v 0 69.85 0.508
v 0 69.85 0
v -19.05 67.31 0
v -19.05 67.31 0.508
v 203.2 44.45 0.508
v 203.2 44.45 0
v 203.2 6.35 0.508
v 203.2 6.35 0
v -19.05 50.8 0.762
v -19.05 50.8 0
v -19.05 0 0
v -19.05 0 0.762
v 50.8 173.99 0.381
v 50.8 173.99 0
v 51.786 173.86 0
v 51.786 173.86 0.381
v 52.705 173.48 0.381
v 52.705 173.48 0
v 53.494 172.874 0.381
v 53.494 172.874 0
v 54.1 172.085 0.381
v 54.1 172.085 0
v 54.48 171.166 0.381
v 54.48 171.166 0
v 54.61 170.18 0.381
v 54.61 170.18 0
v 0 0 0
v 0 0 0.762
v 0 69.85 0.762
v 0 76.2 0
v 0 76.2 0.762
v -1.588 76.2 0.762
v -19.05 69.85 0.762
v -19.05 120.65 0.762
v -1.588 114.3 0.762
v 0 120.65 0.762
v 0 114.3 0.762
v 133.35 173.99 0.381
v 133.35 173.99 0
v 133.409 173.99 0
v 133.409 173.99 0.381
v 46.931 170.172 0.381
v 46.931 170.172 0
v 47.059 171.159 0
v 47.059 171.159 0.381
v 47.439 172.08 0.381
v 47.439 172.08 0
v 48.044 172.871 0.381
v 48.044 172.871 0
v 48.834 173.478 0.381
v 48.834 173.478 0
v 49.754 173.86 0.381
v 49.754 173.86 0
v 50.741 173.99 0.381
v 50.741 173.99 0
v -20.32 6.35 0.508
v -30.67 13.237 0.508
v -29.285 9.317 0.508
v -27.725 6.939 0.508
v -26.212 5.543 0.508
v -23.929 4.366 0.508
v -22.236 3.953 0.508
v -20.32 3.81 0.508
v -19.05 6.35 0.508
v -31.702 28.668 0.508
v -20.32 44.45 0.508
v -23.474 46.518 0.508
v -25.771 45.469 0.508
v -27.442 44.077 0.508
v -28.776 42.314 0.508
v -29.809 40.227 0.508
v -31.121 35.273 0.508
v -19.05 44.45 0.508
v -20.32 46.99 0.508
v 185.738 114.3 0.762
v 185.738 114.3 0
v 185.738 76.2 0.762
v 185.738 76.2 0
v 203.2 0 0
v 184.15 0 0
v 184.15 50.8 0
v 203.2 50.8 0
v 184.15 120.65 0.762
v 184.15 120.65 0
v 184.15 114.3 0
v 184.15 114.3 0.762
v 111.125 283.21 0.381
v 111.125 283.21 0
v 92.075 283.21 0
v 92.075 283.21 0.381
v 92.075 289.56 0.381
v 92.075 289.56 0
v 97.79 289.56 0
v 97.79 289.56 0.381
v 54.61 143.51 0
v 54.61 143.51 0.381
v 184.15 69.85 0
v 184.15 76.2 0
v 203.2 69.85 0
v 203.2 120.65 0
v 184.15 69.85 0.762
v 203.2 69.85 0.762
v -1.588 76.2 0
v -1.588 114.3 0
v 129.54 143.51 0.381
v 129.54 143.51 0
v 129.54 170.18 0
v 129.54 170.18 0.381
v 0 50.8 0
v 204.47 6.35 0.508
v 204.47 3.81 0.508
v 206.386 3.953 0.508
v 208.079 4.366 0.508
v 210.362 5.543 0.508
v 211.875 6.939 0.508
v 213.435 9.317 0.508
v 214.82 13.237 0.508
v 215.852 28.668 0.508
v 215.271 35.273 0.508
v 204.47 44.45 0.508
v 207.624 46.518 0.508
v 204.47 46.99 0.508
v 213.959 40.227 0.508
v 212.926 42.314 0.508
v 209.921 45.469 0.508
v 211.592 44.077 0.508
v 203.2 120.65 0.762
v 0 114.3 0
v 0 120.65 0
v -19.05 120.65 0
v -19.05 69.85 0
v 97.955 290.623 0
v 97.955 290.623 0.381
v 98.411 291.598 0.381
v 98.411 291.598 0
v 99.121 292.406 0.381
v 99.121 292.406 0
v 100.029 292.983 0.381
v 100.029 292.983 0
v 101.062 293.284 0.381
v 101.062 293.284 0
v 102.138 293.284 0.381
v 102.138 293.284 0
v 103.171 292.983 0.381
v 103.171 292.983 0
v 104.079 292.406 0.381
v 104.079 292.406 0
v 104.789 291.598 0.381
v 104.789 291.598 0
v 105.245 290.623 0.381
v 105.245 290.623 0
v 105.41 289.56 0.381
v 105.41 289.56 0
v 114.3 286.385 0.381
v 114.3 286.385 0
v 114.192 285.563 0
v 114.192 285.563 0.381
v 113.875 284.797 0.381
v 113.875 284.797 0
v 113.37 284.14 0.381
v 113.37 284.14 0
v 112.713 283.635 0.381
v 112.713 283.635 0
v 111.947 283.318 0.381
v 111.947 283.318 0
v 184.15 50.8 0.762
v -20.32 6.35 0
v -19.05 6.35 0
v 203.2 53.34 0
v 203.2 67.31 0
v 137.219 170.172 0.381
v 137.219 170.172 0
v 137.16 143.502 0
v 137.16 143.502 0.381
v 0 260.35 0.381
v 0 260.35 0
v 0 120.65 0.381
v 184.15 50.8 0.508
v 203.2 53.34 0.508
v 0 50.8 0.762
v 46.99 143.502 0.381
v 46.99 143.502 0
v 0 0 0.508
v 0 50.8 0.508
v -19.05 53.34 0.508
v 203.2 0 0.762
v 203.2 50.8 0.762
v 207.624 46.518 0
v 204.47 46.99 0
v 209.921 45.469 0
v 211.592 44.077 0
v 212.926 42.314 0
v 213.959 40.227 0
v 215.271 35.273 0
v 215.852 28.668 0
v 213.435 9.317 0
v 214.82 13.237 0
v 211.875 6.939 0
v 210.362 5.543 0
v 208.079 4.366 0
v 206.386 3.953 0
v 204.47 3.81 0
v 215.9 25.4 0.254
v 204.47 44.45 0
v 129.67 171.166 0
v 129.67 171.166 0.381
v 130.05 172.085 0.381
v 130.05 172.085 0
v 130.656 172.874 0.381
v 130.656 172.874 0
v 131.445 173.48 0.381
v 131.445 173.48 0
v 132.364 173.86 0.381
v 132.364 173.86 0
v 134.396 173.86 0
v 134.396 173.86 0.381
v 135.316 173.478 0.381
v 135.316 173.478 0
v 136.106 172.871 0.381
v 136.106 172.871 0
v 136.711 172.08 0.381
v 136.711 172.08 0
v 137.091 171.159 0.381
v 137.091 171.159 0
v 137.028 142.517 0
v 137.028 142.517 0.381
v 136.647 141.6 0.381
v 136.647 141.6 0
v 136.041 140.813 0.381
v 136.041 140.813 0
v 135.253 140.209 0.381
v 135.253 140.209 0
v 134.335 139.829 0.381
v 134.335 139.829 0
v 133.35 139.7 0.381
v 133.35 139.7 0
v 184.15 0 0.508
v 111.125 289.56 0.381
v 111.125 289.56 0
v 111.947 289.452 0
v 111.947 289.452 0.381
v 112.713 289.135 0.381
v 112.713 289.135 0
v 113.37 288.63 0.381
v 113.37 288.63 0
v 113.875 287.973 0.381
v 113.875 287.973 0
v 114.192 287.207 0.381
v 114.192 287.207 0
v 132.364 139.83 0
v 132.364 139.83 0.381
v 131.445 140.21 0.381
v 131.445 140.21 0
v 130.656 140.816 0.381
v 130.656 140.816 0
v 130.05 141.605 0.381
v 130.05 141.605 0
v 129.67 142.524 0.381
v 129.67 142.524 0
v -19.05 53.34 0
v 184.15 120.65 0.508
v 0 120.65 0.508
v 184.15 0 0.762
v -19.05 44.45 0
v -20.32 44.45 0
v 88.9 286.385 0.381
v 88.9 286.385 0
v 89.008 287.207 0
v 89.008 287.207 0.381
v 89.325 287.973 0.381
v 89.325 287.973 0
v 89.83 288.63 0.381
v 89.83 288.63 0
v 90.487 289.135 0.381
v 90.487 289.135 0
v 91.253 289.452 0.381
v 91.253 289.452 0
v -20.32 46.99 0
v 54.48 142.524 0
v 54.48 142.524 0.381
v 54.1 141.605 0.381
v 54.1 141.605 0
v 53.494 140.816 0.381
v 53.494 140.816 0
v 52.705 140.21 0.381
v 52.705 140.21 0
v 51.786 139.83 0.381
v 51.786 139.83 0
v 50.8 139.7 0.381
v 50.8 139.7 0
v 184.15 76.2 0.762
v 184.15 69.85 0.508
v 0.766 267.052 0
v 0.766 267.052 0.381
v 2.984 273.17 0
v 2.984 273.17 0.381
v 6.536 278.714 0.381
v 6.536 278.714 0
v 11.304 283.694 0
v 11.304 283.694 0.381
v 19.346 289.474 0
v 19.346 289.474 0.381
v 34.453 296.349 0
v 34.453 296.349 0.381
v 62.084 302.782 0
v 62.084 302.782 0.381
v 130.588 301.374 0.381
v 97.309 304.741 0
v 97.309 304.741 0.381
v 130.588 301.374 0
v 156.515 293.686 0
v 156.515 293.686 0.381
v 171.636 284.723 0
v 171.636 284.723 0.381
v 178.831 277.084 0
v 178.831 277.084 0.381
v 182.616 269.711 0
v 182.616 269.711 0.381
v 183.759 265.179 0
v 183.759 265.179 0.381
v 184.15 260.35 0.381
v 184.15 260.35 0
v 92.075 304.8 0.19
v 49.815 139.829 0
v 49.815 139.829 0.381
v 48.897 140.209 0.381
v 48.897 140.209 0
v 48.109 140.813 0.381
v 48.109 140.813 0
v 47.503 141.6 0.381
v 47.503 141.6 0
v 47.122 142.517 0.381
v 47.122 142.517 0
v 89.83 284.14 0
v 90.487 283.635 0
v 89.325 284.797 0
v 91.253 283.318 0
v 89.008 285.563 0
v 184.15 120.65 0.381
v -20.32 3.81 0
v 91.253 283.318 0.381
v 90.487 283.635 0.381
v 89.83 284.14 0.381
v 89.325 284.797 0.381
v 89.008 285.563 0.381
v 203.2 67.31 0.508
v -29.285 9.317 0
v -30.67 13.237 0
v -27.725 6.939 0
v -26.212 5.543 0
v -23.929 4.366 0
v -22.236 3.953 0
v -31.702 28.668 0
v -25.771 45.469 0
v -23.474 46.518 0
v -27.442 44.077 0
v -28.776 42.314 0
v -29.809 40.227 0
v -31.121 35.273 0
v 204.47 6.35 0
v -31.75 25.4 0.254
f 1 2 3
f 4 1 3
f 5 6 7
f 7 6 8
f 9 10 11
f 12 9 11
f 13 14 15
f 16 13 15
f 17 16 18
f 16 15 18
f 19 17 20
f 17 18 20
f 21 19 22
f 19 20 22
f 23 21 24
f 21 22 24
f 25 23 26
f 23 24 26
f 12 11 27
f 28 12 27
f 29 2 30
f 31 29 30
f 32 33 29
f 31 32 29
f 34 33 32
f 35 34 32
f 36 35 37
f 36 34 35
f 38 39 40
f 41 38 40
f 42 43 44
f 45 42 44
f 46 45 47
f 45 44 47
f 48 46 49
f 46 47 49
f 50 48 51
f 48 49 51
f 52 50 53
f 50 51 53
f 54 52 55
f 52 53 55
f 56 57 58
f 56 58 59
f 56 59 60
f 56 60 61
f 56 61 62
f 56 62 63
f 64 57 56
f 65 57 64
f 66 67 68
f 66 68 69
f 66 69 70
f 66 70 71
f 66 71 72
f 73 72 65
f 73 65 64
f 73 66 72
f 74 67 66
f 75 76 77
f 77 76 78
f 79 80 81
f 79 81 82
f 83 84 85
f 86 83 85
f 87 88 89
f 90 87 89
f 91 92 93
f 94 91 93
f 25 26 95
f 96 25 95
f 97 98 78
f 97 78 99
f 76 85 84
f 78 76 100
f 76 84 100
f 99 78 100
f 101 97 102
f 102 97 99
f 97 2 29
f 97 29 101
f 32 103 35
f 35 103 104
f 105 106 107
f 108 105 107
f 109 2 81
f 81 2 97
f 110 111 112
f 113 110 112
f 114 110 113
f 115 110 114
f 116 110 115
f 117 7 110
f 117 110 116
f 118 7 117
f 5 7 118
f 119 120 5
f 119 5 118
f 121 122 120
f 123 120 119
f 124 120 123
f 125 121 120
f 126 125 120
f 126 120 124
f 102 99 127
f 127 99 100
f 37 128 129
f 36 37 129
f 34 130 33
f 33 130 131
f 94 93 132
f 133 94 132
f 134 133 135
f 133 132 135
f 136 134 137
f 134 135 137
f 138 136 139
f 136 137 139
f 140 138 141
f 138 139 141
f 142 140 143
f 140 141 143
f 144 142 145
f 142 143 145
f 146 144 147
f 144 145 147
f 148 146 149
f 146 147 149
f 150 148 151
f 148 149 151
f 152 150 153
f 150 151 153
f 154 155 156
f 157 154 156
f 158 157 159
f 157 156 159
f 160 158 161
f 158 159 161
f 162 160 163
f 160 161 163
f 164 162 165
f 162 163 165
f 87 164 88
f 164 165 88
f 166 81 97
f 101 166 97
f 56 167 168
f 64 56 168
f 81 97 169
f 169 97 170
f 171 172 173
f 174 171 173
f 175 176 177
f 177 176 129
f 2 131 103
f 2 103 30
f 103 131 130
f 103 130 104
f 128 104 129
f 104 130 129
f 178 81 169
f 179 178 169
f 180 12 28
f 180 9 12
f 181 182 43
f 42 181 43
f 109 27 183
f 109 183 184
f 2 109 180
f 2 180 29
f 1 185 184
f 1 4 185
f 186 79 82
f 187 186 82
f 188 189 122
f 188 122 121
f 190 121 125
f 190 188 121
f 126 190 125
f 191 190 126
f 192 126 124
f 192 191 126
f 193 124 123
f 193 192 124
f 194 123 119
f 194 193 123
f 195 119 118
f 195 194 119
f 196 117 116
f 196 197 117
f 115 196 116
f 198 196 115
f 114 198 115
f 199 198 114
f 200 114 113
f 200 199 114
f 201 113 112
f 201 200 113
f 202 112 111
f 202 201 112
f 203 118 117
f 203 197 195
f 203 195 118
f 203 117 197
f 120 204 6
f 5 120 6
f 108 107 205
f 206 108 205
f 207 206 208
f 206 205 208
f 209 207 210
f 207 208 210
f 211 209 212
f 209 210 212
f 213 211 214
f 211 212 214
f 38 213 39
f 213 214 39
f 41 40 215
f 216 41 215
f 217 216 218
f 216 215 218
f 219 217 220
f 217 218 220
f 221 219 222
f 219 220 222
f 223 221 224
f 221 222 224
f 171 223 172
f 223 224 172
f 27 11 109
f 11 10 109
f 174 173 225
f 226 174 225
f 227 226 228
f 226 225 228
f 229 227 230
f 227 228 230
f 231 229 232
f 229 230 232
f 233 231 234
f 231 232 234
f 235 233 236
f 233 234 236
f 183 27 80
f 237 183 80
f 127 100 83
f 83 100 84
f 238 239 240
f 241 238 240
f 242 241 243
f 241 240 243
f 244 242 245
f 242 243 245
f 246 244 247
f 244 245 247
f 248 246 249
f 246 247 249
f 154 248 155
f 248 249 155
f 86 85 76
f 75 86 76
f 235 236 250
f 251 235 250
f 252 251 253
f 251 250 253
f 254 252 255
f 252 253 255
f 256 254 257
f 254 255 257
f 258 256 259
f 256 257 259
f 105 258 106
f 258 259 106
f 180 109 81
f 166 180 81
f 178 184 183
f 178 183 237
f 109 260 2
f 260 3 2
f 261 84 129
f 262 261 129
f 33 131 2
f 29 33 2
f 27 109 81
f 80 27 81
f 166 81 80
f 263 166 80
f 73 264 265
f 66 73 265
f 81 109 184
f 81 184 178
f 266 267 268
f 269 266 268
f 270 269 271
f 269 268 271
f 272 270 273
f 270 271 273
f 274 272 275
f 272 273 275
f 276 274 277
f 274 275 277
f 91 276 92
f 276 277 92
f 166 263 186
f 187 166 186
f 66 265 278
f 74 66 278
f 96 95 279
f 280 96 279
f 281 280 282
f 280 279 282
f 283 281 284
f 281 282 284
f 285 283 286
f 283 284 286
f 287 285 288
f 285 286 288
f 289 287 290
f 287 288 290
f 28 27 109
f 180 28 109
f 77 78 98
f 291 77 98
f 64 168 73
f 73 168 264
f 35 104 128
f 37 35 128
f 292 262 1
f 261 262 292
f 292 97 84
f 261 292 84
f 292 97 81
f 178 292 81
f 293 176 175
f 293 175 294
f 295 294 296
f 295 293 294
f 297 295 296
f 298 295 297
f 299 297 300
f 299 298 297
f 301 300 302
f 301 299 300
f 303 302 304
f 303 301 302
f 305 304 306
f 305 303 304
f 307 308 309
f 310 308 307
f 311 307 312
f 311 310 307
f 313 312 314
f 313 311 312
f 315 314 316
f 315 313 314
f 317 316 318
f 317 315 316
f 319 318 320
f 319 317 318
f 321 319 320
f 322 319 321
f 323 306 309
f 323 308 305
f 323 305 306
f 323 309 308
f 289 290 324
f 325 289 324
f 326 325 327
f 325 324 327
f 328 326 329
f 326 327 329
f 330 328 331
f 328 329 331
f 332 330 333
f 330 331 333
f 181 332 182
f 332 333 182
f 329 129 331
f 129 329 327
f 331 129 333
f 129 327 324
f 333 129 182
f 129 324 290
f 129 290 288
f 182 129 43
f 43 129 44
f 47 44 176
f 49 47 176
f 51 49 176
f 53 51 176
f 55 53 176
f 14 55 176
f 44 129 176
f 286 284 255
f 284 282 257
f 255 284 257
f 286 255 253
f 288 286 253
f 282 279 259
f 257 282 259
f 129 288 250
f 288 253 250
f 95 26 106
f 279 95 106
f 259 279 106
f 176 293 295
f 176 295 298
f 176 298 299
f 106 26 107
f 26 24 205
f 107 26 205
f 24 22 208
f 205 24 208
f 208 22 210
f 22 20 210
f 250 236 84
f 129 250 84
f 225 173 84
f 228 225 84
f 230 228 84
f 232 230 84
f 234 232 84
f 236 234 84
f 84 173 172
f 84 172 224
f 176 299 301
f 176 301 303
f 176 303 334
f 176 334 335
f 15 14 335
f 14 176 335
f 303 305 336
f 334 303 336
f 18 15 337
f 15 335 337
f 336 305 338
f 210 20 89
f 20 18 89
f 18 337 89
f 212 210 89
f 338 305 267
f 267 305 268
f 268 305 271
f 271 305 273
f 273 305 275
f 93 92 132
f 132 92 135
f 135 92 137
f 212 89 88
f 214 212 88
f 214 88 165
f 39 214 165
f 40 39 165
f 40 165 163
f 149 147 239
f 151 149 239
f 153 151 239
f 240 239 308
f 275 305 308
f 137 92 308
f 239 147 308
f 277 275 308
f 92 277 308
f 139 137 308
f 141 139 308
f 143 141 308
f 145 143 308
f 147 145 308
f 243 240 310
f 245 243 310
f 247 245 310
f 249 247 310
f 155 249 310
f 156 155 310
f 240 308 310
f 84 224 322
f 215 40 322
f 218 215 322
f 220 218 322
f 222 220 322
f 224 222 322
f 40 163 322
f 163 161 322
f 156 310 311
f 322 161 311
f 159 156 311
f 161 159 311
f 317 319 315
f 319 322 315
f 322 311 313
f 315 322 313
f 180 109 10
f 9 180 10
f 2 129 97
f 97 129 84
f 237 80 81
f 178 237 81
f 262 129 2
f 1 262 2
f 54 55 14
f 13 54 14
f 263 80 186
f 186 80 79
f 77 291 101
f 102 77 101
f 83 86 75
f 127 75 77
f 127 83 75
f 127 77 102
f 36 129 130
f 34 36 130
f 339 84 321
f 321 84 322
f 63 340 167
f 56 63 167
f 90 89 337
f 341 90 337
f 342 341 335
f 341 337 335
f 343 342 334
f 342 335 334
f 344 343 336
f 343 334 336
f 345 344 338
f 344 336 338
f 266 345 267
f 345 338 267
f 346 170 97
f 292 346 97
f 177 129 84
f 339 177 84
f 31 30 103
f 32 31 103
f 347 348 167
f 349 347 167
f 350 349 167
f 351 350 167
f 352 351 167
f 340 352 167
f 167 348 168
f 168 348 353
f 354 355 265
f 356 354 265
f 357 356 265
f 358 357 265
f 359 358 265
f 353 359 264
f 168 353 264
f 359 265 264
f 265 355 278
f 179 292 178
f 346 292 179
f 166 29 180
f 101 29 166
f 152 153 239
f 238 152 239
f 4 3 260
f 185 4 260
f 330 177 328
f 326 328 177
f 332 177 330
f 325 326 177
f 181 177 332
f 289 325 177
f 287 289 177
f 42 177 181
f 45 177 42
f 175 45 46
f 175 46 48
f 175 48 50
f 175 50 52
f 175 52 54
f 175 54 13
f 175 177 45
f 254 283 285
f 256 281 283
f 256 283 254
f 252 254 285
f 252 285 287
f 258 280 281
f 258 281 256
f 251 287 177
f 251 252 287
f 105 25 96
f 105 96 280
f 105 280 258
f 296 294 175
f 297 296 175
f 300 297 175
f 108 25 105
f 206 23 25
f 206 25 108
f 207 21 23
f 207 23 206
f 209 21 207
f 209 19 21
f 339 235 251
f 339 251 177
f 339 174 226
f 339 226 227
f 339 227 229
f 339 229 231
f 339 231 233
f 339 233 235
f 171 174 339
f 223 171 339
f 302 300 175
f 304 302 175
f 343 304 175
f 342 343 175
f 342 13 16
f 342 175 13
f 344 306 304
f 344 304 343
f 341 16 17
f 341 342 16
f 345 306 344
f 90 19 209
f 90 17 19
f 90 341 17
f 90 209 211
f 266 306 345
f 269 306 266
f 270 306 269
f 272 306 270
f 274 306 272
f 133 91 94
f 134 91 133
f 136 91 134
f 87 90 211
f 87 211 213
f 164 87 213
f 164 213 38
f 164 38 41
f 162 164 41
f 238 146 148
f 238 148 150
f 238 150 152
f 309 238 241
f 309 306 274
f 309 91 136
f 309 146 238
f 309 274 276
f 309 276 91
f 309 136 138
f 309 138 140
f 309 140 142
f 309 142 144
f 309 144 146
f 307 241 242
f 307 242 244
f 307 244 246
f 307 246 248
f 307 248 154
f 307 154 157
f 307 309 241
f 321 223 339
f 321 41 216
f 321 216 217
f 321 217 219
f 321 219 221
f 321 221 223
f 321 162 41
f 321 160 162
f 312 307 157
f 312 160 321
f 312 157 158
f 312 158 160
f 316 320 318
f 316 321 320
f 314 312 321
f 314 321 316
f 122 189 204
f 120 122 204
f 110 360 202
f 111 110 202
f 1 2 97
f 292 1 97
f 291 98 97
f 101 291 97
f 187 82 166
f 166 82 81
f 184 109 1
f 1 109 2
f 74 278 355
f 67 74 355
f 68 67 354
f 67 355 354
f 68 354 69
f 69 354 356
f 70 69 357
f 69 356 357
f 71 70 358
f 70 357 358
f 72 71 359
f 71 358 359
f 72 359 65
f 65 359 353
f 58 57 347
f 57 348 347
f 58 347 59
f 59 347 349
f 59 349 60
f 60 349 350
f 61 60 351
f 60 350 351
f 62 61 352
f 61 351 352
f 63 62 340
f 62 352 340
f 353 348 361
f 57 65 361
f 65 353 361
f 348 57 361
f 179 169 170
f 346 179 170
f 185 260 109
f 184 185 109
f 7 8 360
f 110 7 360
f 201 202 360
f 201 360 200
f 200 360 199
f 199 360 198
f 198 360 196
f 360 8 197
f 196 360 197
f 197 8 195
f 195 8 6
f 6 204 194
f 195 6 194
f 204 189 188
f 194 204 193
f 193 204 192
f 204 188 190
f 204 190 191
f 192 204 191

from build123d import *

# Parameters (mm, degrees)
F0_W     = 184.15
F0_H     = 50.8
F1_DEPTH = 0.508
F0_H_2   = 19.05
F2_DEPTH = 0.762
F3_DEPTH = 0.381


# Not quite as in the source:
# - ends of sketch curves that miss each other by under 0.0002 mm in the source are joined


with BuildPart() as f1:
    # F0 (on Top) → F1 (new body)
    with BuildSketch(Plane.XY):
        with Locations((92.075, 25.4)):
            Rectangle(F0_W, F0_H)
    extrude(amount=F1_DEPTH)


with BuildPart() as f1b:
    # F0 (on Top) → F1, piece 2 (new body)
    with BuildSketch(Plane.XY):
        Polygon((-19.05, 53.34), (0, 50.8), (0, 69.85), (-19.05, 67.31), align=None)
    extrude(amount=F1_DEPTH)


with BuildPart() as f1c:
    # F0 (on Top) → F1, piece 3 (new body)
    with BuildSketch(Plane.XY):
        Polygon((184.15, 69.85), (184.15, 50.8), (203.2, 53.34), (203.2, 67.31), align=None)
    extrude(amount=F1_DEPTH)


with BuildPart() as f1d:
    # F0 (on Top) → F1, piece 4 (new body)
    with BuildSketch(Plane.XY):
        Polygon((0, 76.2), (0, 69.85), (184.15, 69.85), (184.15, 76.2), (184.15, 114.3), (184.15, 120.65), (0, 120.65), (0, 114.3), align=None)
    extrude(amount=F1_DEPTH)


with BuildPart() as f1e:
    # F0 (on Top) → F1, piece 5 (new body)
    with BuildSketch(Plane.XY):
        with BuildLine():
            Line((203.2, 44.45), (203.2, 6.35))
            Line((203.2, 6.35), (204.47, 6.35))
            Line((204.47, 6.35), (204.47, 3.81))
            add(Edge.make_bspline(
                [(204.47, 46.99), (214.63, 46.762470156), (217.17, 25.5095088242), (214.63, 3.8185121957), (204.47, 3.81)],
                knots=[0, 0, 0, 0, 0.5, 1, 1, 1, 1], degree=3))
            Line((204.47, 46.99), (204.47, 44.45))
            Line((204.47, 44.45), (203.2, 44.45))
        make_face()
    extrude(amount=F1_DEPTH)


with BuildPart() as f1f:
    # F0 (on Top) → F1, piece 6 (new body)
    with BuildSketch(Plane.XY):
        with BuildLine():
            Line((-19.05, 6.35), (-19.05, 44.45))
            Line((-19.05, 44.45), (-20.32, 44.45))
            Line((-20.32, 44.45), (-20.32, 46.99))
            add(Edge.make_bspline(
                [(-20.32, 46.99), (-30.48, 46.762470156), (-33.02, 25.5095088242), (-30.48, 3.8185121957), (-20.32, 3.81)],
                knots=[0, 0, 0, 0, 0.5, 1, 1, 1, 1], degree=3))
            Line((-20.32, 3.81), (-20.32, 6.35))
            Line((-20.32, 6.35), (-19.05, 6.35))
        make_face()
    extrude(amount=F1_DEPTH)


with BuildPart() as f2:
    # F0 (on Top) → F2 (new body)
    with BuildSketch(Plane.XY):
        with Locations((92.075, 60.325)):
            Rectangle(F0_W, F0_H_2)
    extrude(amount=F2_DEPTH)


with BuildPart() as f2b:
    # F0 (on Top) → F2, piece 2 (new body)
    with BuildSketch(Plane.XY):
        Polygon((184.15, 76.2), (184.15, 69.85), (203.2, 69.85), (203.2, 120.65), (184.15, 120.65), (184.15, 114.3), (185.7375, 114.3), (185.7375, 76.2), align=None)
    extrude(amount=F2_DEPTH)


with BuildPart() as f2c:
    # F0 (on Top) → F2, piece 3 (new body)
    with BuildSketch(Plane.XY):
        Polygon((184.15, 50.8), (184.15, 0), (203.2, 0), (203.2, 6.35), (203.2, 44.45), (203.2, 50.8), align=None)
    extrude(amount=F2_DEPTH)


with BuildPart() as f2d:
    # F0 (on Top) → F2, piece 4 (new body)
    with BuildSketch(Plane.XY):
        Polygon((-19.05, 0), (0, 0), (0, 50.8), (-19.05, 50.8), (-19.05, 44.45), (-19.05, 6.35), (-19.05, 3.81), align=None)
    extrude(amount=F2_DEPTH)


with BuildPart() as f2e:
    # F0 (on Top) → F2, piece 5 (new body)
    with BuildSketch(Plane.XY):
        Polygon((-19.05, 69.85), (0, 69.85), (0, 76.2), (-1.5875, 76.2), (-1.5875, 114.3), (0, 114.3), (0, 120.65), (-19.05, 120.65), align=None)
    extrude(amount=F2_DEPTH)


with BuildPart() as f3:
    # F0 (on Top) → F3 (new body)
    with BuildSketch(Plane.XY):
        with BuildLine():
            Line((0, 260.35), (0, 120.65))
            Line((0, 120.65), (184.15, 120.65))
            Line((184.15, 120.65), (184.15, 260.35))
            add(Edge.make_bspline(
                [(0, 260.35), (0, 291.2788689137), (92.075, 318.3211310863), (184.15, 291.2788689137), (184.15, 260.35)],
                knots=[0, 0, 0, 0, 0.5, 1, 1, 1, 1], degree=3))
        make_face()
        with BuildLine():
            ThreePointArc((54.61, 143.5100303088), (53.4940670417, 140.8159436779), (50.7999722968, 139.7000303089))
            ThreePointArc((50.7999722968, 139.7000303089), (48.1088940654, 140.8129811804), (46.9900046733, 143.5015910564))
            Line((46.9900046733, 143.5015910564), (46.9309298286, 170.171560748))
            ThreePointArc((46.9309298286, 170.171560748), (48.0438819902, 172.8711119219), (50.7409783035, 173.99))
            Line((50.7409783035, 173.99), (50.8000578216, 173.9899991034))
            ThreePointArc((50.8000578216, 173.9899991034), (53.4940972793, 172.8740554971), (54.61, 170.1799991038))
            Line((54.61, 170.1799991038), (54.61, 143.5100303088))
        make_face(mode=Mode.SUBTRACT)
        with BuildLine():
            Line((129.54, 143.5100303088), (129.54, 170.1799991038))
            ThreePointArc((129.54, 170.1799991038), (130.6559027207, 172.8740554971), (133.3499421784, 173.9899991034))
            Line((133.3499421784, 173.9899991034), (133.4090216965, 173.99))
            ThreePointArc((133.4090216965, 173.99), (136.1061180098, 172.8711119219), (137.2190701714, 170.171560748))
            Line((137.2190701714, 170.171560748), (137.1599953267, 143.5015910564))
            ThreePointArc((137.1599953267, 143.5015910564), (136.0411059346, 140.8129811804), (133.3500323765, 139.7000303089))
            ThreePointArc((133.3500323765, 139.7000303089), (130.6559329583, 140.8159436779), (129.54, 143.5100303088))
        make_face(mode=Mode.SUBTRACT)
        with BuildLine():
            Line((111.125, 283.21), (92.075, 283.21))
            ThreePointArc((92.075, 283.21), (89.8299359697, 284.1399359697), (88.9, 286.385))
            ThreePointArc((88.9, 286.385), (89.8299359697, 288.6300640303), (92.075, 289.56))
            Line((92.075, 289.56), (97.79, 289.56))
            ThreePointArc((97.79, 289.56), (101.6, 293.3223531569), (105.41, 289.56))
            Line((105.41, 289.56), (111.125, 289.56))
            ThreePointArc((111.125, 289.56), (113.3700640303, 288.6300640303), (114.3, 286.385))
            ThreePointArc((114.3, 286.385), (113.3700640303, 284.1399359697), (111.125, 283.21))
        make_face(mode=Mode.SUBTRACT)
    extrude(amount=F3_DEPTH)


solid = Compound([f1.part, f1b.part, f1c.part, f1d.part, f1e.part, f1f.part, f2.part, f2b.part, f2c.part, f2d.part, f2e.part, f3.part])
